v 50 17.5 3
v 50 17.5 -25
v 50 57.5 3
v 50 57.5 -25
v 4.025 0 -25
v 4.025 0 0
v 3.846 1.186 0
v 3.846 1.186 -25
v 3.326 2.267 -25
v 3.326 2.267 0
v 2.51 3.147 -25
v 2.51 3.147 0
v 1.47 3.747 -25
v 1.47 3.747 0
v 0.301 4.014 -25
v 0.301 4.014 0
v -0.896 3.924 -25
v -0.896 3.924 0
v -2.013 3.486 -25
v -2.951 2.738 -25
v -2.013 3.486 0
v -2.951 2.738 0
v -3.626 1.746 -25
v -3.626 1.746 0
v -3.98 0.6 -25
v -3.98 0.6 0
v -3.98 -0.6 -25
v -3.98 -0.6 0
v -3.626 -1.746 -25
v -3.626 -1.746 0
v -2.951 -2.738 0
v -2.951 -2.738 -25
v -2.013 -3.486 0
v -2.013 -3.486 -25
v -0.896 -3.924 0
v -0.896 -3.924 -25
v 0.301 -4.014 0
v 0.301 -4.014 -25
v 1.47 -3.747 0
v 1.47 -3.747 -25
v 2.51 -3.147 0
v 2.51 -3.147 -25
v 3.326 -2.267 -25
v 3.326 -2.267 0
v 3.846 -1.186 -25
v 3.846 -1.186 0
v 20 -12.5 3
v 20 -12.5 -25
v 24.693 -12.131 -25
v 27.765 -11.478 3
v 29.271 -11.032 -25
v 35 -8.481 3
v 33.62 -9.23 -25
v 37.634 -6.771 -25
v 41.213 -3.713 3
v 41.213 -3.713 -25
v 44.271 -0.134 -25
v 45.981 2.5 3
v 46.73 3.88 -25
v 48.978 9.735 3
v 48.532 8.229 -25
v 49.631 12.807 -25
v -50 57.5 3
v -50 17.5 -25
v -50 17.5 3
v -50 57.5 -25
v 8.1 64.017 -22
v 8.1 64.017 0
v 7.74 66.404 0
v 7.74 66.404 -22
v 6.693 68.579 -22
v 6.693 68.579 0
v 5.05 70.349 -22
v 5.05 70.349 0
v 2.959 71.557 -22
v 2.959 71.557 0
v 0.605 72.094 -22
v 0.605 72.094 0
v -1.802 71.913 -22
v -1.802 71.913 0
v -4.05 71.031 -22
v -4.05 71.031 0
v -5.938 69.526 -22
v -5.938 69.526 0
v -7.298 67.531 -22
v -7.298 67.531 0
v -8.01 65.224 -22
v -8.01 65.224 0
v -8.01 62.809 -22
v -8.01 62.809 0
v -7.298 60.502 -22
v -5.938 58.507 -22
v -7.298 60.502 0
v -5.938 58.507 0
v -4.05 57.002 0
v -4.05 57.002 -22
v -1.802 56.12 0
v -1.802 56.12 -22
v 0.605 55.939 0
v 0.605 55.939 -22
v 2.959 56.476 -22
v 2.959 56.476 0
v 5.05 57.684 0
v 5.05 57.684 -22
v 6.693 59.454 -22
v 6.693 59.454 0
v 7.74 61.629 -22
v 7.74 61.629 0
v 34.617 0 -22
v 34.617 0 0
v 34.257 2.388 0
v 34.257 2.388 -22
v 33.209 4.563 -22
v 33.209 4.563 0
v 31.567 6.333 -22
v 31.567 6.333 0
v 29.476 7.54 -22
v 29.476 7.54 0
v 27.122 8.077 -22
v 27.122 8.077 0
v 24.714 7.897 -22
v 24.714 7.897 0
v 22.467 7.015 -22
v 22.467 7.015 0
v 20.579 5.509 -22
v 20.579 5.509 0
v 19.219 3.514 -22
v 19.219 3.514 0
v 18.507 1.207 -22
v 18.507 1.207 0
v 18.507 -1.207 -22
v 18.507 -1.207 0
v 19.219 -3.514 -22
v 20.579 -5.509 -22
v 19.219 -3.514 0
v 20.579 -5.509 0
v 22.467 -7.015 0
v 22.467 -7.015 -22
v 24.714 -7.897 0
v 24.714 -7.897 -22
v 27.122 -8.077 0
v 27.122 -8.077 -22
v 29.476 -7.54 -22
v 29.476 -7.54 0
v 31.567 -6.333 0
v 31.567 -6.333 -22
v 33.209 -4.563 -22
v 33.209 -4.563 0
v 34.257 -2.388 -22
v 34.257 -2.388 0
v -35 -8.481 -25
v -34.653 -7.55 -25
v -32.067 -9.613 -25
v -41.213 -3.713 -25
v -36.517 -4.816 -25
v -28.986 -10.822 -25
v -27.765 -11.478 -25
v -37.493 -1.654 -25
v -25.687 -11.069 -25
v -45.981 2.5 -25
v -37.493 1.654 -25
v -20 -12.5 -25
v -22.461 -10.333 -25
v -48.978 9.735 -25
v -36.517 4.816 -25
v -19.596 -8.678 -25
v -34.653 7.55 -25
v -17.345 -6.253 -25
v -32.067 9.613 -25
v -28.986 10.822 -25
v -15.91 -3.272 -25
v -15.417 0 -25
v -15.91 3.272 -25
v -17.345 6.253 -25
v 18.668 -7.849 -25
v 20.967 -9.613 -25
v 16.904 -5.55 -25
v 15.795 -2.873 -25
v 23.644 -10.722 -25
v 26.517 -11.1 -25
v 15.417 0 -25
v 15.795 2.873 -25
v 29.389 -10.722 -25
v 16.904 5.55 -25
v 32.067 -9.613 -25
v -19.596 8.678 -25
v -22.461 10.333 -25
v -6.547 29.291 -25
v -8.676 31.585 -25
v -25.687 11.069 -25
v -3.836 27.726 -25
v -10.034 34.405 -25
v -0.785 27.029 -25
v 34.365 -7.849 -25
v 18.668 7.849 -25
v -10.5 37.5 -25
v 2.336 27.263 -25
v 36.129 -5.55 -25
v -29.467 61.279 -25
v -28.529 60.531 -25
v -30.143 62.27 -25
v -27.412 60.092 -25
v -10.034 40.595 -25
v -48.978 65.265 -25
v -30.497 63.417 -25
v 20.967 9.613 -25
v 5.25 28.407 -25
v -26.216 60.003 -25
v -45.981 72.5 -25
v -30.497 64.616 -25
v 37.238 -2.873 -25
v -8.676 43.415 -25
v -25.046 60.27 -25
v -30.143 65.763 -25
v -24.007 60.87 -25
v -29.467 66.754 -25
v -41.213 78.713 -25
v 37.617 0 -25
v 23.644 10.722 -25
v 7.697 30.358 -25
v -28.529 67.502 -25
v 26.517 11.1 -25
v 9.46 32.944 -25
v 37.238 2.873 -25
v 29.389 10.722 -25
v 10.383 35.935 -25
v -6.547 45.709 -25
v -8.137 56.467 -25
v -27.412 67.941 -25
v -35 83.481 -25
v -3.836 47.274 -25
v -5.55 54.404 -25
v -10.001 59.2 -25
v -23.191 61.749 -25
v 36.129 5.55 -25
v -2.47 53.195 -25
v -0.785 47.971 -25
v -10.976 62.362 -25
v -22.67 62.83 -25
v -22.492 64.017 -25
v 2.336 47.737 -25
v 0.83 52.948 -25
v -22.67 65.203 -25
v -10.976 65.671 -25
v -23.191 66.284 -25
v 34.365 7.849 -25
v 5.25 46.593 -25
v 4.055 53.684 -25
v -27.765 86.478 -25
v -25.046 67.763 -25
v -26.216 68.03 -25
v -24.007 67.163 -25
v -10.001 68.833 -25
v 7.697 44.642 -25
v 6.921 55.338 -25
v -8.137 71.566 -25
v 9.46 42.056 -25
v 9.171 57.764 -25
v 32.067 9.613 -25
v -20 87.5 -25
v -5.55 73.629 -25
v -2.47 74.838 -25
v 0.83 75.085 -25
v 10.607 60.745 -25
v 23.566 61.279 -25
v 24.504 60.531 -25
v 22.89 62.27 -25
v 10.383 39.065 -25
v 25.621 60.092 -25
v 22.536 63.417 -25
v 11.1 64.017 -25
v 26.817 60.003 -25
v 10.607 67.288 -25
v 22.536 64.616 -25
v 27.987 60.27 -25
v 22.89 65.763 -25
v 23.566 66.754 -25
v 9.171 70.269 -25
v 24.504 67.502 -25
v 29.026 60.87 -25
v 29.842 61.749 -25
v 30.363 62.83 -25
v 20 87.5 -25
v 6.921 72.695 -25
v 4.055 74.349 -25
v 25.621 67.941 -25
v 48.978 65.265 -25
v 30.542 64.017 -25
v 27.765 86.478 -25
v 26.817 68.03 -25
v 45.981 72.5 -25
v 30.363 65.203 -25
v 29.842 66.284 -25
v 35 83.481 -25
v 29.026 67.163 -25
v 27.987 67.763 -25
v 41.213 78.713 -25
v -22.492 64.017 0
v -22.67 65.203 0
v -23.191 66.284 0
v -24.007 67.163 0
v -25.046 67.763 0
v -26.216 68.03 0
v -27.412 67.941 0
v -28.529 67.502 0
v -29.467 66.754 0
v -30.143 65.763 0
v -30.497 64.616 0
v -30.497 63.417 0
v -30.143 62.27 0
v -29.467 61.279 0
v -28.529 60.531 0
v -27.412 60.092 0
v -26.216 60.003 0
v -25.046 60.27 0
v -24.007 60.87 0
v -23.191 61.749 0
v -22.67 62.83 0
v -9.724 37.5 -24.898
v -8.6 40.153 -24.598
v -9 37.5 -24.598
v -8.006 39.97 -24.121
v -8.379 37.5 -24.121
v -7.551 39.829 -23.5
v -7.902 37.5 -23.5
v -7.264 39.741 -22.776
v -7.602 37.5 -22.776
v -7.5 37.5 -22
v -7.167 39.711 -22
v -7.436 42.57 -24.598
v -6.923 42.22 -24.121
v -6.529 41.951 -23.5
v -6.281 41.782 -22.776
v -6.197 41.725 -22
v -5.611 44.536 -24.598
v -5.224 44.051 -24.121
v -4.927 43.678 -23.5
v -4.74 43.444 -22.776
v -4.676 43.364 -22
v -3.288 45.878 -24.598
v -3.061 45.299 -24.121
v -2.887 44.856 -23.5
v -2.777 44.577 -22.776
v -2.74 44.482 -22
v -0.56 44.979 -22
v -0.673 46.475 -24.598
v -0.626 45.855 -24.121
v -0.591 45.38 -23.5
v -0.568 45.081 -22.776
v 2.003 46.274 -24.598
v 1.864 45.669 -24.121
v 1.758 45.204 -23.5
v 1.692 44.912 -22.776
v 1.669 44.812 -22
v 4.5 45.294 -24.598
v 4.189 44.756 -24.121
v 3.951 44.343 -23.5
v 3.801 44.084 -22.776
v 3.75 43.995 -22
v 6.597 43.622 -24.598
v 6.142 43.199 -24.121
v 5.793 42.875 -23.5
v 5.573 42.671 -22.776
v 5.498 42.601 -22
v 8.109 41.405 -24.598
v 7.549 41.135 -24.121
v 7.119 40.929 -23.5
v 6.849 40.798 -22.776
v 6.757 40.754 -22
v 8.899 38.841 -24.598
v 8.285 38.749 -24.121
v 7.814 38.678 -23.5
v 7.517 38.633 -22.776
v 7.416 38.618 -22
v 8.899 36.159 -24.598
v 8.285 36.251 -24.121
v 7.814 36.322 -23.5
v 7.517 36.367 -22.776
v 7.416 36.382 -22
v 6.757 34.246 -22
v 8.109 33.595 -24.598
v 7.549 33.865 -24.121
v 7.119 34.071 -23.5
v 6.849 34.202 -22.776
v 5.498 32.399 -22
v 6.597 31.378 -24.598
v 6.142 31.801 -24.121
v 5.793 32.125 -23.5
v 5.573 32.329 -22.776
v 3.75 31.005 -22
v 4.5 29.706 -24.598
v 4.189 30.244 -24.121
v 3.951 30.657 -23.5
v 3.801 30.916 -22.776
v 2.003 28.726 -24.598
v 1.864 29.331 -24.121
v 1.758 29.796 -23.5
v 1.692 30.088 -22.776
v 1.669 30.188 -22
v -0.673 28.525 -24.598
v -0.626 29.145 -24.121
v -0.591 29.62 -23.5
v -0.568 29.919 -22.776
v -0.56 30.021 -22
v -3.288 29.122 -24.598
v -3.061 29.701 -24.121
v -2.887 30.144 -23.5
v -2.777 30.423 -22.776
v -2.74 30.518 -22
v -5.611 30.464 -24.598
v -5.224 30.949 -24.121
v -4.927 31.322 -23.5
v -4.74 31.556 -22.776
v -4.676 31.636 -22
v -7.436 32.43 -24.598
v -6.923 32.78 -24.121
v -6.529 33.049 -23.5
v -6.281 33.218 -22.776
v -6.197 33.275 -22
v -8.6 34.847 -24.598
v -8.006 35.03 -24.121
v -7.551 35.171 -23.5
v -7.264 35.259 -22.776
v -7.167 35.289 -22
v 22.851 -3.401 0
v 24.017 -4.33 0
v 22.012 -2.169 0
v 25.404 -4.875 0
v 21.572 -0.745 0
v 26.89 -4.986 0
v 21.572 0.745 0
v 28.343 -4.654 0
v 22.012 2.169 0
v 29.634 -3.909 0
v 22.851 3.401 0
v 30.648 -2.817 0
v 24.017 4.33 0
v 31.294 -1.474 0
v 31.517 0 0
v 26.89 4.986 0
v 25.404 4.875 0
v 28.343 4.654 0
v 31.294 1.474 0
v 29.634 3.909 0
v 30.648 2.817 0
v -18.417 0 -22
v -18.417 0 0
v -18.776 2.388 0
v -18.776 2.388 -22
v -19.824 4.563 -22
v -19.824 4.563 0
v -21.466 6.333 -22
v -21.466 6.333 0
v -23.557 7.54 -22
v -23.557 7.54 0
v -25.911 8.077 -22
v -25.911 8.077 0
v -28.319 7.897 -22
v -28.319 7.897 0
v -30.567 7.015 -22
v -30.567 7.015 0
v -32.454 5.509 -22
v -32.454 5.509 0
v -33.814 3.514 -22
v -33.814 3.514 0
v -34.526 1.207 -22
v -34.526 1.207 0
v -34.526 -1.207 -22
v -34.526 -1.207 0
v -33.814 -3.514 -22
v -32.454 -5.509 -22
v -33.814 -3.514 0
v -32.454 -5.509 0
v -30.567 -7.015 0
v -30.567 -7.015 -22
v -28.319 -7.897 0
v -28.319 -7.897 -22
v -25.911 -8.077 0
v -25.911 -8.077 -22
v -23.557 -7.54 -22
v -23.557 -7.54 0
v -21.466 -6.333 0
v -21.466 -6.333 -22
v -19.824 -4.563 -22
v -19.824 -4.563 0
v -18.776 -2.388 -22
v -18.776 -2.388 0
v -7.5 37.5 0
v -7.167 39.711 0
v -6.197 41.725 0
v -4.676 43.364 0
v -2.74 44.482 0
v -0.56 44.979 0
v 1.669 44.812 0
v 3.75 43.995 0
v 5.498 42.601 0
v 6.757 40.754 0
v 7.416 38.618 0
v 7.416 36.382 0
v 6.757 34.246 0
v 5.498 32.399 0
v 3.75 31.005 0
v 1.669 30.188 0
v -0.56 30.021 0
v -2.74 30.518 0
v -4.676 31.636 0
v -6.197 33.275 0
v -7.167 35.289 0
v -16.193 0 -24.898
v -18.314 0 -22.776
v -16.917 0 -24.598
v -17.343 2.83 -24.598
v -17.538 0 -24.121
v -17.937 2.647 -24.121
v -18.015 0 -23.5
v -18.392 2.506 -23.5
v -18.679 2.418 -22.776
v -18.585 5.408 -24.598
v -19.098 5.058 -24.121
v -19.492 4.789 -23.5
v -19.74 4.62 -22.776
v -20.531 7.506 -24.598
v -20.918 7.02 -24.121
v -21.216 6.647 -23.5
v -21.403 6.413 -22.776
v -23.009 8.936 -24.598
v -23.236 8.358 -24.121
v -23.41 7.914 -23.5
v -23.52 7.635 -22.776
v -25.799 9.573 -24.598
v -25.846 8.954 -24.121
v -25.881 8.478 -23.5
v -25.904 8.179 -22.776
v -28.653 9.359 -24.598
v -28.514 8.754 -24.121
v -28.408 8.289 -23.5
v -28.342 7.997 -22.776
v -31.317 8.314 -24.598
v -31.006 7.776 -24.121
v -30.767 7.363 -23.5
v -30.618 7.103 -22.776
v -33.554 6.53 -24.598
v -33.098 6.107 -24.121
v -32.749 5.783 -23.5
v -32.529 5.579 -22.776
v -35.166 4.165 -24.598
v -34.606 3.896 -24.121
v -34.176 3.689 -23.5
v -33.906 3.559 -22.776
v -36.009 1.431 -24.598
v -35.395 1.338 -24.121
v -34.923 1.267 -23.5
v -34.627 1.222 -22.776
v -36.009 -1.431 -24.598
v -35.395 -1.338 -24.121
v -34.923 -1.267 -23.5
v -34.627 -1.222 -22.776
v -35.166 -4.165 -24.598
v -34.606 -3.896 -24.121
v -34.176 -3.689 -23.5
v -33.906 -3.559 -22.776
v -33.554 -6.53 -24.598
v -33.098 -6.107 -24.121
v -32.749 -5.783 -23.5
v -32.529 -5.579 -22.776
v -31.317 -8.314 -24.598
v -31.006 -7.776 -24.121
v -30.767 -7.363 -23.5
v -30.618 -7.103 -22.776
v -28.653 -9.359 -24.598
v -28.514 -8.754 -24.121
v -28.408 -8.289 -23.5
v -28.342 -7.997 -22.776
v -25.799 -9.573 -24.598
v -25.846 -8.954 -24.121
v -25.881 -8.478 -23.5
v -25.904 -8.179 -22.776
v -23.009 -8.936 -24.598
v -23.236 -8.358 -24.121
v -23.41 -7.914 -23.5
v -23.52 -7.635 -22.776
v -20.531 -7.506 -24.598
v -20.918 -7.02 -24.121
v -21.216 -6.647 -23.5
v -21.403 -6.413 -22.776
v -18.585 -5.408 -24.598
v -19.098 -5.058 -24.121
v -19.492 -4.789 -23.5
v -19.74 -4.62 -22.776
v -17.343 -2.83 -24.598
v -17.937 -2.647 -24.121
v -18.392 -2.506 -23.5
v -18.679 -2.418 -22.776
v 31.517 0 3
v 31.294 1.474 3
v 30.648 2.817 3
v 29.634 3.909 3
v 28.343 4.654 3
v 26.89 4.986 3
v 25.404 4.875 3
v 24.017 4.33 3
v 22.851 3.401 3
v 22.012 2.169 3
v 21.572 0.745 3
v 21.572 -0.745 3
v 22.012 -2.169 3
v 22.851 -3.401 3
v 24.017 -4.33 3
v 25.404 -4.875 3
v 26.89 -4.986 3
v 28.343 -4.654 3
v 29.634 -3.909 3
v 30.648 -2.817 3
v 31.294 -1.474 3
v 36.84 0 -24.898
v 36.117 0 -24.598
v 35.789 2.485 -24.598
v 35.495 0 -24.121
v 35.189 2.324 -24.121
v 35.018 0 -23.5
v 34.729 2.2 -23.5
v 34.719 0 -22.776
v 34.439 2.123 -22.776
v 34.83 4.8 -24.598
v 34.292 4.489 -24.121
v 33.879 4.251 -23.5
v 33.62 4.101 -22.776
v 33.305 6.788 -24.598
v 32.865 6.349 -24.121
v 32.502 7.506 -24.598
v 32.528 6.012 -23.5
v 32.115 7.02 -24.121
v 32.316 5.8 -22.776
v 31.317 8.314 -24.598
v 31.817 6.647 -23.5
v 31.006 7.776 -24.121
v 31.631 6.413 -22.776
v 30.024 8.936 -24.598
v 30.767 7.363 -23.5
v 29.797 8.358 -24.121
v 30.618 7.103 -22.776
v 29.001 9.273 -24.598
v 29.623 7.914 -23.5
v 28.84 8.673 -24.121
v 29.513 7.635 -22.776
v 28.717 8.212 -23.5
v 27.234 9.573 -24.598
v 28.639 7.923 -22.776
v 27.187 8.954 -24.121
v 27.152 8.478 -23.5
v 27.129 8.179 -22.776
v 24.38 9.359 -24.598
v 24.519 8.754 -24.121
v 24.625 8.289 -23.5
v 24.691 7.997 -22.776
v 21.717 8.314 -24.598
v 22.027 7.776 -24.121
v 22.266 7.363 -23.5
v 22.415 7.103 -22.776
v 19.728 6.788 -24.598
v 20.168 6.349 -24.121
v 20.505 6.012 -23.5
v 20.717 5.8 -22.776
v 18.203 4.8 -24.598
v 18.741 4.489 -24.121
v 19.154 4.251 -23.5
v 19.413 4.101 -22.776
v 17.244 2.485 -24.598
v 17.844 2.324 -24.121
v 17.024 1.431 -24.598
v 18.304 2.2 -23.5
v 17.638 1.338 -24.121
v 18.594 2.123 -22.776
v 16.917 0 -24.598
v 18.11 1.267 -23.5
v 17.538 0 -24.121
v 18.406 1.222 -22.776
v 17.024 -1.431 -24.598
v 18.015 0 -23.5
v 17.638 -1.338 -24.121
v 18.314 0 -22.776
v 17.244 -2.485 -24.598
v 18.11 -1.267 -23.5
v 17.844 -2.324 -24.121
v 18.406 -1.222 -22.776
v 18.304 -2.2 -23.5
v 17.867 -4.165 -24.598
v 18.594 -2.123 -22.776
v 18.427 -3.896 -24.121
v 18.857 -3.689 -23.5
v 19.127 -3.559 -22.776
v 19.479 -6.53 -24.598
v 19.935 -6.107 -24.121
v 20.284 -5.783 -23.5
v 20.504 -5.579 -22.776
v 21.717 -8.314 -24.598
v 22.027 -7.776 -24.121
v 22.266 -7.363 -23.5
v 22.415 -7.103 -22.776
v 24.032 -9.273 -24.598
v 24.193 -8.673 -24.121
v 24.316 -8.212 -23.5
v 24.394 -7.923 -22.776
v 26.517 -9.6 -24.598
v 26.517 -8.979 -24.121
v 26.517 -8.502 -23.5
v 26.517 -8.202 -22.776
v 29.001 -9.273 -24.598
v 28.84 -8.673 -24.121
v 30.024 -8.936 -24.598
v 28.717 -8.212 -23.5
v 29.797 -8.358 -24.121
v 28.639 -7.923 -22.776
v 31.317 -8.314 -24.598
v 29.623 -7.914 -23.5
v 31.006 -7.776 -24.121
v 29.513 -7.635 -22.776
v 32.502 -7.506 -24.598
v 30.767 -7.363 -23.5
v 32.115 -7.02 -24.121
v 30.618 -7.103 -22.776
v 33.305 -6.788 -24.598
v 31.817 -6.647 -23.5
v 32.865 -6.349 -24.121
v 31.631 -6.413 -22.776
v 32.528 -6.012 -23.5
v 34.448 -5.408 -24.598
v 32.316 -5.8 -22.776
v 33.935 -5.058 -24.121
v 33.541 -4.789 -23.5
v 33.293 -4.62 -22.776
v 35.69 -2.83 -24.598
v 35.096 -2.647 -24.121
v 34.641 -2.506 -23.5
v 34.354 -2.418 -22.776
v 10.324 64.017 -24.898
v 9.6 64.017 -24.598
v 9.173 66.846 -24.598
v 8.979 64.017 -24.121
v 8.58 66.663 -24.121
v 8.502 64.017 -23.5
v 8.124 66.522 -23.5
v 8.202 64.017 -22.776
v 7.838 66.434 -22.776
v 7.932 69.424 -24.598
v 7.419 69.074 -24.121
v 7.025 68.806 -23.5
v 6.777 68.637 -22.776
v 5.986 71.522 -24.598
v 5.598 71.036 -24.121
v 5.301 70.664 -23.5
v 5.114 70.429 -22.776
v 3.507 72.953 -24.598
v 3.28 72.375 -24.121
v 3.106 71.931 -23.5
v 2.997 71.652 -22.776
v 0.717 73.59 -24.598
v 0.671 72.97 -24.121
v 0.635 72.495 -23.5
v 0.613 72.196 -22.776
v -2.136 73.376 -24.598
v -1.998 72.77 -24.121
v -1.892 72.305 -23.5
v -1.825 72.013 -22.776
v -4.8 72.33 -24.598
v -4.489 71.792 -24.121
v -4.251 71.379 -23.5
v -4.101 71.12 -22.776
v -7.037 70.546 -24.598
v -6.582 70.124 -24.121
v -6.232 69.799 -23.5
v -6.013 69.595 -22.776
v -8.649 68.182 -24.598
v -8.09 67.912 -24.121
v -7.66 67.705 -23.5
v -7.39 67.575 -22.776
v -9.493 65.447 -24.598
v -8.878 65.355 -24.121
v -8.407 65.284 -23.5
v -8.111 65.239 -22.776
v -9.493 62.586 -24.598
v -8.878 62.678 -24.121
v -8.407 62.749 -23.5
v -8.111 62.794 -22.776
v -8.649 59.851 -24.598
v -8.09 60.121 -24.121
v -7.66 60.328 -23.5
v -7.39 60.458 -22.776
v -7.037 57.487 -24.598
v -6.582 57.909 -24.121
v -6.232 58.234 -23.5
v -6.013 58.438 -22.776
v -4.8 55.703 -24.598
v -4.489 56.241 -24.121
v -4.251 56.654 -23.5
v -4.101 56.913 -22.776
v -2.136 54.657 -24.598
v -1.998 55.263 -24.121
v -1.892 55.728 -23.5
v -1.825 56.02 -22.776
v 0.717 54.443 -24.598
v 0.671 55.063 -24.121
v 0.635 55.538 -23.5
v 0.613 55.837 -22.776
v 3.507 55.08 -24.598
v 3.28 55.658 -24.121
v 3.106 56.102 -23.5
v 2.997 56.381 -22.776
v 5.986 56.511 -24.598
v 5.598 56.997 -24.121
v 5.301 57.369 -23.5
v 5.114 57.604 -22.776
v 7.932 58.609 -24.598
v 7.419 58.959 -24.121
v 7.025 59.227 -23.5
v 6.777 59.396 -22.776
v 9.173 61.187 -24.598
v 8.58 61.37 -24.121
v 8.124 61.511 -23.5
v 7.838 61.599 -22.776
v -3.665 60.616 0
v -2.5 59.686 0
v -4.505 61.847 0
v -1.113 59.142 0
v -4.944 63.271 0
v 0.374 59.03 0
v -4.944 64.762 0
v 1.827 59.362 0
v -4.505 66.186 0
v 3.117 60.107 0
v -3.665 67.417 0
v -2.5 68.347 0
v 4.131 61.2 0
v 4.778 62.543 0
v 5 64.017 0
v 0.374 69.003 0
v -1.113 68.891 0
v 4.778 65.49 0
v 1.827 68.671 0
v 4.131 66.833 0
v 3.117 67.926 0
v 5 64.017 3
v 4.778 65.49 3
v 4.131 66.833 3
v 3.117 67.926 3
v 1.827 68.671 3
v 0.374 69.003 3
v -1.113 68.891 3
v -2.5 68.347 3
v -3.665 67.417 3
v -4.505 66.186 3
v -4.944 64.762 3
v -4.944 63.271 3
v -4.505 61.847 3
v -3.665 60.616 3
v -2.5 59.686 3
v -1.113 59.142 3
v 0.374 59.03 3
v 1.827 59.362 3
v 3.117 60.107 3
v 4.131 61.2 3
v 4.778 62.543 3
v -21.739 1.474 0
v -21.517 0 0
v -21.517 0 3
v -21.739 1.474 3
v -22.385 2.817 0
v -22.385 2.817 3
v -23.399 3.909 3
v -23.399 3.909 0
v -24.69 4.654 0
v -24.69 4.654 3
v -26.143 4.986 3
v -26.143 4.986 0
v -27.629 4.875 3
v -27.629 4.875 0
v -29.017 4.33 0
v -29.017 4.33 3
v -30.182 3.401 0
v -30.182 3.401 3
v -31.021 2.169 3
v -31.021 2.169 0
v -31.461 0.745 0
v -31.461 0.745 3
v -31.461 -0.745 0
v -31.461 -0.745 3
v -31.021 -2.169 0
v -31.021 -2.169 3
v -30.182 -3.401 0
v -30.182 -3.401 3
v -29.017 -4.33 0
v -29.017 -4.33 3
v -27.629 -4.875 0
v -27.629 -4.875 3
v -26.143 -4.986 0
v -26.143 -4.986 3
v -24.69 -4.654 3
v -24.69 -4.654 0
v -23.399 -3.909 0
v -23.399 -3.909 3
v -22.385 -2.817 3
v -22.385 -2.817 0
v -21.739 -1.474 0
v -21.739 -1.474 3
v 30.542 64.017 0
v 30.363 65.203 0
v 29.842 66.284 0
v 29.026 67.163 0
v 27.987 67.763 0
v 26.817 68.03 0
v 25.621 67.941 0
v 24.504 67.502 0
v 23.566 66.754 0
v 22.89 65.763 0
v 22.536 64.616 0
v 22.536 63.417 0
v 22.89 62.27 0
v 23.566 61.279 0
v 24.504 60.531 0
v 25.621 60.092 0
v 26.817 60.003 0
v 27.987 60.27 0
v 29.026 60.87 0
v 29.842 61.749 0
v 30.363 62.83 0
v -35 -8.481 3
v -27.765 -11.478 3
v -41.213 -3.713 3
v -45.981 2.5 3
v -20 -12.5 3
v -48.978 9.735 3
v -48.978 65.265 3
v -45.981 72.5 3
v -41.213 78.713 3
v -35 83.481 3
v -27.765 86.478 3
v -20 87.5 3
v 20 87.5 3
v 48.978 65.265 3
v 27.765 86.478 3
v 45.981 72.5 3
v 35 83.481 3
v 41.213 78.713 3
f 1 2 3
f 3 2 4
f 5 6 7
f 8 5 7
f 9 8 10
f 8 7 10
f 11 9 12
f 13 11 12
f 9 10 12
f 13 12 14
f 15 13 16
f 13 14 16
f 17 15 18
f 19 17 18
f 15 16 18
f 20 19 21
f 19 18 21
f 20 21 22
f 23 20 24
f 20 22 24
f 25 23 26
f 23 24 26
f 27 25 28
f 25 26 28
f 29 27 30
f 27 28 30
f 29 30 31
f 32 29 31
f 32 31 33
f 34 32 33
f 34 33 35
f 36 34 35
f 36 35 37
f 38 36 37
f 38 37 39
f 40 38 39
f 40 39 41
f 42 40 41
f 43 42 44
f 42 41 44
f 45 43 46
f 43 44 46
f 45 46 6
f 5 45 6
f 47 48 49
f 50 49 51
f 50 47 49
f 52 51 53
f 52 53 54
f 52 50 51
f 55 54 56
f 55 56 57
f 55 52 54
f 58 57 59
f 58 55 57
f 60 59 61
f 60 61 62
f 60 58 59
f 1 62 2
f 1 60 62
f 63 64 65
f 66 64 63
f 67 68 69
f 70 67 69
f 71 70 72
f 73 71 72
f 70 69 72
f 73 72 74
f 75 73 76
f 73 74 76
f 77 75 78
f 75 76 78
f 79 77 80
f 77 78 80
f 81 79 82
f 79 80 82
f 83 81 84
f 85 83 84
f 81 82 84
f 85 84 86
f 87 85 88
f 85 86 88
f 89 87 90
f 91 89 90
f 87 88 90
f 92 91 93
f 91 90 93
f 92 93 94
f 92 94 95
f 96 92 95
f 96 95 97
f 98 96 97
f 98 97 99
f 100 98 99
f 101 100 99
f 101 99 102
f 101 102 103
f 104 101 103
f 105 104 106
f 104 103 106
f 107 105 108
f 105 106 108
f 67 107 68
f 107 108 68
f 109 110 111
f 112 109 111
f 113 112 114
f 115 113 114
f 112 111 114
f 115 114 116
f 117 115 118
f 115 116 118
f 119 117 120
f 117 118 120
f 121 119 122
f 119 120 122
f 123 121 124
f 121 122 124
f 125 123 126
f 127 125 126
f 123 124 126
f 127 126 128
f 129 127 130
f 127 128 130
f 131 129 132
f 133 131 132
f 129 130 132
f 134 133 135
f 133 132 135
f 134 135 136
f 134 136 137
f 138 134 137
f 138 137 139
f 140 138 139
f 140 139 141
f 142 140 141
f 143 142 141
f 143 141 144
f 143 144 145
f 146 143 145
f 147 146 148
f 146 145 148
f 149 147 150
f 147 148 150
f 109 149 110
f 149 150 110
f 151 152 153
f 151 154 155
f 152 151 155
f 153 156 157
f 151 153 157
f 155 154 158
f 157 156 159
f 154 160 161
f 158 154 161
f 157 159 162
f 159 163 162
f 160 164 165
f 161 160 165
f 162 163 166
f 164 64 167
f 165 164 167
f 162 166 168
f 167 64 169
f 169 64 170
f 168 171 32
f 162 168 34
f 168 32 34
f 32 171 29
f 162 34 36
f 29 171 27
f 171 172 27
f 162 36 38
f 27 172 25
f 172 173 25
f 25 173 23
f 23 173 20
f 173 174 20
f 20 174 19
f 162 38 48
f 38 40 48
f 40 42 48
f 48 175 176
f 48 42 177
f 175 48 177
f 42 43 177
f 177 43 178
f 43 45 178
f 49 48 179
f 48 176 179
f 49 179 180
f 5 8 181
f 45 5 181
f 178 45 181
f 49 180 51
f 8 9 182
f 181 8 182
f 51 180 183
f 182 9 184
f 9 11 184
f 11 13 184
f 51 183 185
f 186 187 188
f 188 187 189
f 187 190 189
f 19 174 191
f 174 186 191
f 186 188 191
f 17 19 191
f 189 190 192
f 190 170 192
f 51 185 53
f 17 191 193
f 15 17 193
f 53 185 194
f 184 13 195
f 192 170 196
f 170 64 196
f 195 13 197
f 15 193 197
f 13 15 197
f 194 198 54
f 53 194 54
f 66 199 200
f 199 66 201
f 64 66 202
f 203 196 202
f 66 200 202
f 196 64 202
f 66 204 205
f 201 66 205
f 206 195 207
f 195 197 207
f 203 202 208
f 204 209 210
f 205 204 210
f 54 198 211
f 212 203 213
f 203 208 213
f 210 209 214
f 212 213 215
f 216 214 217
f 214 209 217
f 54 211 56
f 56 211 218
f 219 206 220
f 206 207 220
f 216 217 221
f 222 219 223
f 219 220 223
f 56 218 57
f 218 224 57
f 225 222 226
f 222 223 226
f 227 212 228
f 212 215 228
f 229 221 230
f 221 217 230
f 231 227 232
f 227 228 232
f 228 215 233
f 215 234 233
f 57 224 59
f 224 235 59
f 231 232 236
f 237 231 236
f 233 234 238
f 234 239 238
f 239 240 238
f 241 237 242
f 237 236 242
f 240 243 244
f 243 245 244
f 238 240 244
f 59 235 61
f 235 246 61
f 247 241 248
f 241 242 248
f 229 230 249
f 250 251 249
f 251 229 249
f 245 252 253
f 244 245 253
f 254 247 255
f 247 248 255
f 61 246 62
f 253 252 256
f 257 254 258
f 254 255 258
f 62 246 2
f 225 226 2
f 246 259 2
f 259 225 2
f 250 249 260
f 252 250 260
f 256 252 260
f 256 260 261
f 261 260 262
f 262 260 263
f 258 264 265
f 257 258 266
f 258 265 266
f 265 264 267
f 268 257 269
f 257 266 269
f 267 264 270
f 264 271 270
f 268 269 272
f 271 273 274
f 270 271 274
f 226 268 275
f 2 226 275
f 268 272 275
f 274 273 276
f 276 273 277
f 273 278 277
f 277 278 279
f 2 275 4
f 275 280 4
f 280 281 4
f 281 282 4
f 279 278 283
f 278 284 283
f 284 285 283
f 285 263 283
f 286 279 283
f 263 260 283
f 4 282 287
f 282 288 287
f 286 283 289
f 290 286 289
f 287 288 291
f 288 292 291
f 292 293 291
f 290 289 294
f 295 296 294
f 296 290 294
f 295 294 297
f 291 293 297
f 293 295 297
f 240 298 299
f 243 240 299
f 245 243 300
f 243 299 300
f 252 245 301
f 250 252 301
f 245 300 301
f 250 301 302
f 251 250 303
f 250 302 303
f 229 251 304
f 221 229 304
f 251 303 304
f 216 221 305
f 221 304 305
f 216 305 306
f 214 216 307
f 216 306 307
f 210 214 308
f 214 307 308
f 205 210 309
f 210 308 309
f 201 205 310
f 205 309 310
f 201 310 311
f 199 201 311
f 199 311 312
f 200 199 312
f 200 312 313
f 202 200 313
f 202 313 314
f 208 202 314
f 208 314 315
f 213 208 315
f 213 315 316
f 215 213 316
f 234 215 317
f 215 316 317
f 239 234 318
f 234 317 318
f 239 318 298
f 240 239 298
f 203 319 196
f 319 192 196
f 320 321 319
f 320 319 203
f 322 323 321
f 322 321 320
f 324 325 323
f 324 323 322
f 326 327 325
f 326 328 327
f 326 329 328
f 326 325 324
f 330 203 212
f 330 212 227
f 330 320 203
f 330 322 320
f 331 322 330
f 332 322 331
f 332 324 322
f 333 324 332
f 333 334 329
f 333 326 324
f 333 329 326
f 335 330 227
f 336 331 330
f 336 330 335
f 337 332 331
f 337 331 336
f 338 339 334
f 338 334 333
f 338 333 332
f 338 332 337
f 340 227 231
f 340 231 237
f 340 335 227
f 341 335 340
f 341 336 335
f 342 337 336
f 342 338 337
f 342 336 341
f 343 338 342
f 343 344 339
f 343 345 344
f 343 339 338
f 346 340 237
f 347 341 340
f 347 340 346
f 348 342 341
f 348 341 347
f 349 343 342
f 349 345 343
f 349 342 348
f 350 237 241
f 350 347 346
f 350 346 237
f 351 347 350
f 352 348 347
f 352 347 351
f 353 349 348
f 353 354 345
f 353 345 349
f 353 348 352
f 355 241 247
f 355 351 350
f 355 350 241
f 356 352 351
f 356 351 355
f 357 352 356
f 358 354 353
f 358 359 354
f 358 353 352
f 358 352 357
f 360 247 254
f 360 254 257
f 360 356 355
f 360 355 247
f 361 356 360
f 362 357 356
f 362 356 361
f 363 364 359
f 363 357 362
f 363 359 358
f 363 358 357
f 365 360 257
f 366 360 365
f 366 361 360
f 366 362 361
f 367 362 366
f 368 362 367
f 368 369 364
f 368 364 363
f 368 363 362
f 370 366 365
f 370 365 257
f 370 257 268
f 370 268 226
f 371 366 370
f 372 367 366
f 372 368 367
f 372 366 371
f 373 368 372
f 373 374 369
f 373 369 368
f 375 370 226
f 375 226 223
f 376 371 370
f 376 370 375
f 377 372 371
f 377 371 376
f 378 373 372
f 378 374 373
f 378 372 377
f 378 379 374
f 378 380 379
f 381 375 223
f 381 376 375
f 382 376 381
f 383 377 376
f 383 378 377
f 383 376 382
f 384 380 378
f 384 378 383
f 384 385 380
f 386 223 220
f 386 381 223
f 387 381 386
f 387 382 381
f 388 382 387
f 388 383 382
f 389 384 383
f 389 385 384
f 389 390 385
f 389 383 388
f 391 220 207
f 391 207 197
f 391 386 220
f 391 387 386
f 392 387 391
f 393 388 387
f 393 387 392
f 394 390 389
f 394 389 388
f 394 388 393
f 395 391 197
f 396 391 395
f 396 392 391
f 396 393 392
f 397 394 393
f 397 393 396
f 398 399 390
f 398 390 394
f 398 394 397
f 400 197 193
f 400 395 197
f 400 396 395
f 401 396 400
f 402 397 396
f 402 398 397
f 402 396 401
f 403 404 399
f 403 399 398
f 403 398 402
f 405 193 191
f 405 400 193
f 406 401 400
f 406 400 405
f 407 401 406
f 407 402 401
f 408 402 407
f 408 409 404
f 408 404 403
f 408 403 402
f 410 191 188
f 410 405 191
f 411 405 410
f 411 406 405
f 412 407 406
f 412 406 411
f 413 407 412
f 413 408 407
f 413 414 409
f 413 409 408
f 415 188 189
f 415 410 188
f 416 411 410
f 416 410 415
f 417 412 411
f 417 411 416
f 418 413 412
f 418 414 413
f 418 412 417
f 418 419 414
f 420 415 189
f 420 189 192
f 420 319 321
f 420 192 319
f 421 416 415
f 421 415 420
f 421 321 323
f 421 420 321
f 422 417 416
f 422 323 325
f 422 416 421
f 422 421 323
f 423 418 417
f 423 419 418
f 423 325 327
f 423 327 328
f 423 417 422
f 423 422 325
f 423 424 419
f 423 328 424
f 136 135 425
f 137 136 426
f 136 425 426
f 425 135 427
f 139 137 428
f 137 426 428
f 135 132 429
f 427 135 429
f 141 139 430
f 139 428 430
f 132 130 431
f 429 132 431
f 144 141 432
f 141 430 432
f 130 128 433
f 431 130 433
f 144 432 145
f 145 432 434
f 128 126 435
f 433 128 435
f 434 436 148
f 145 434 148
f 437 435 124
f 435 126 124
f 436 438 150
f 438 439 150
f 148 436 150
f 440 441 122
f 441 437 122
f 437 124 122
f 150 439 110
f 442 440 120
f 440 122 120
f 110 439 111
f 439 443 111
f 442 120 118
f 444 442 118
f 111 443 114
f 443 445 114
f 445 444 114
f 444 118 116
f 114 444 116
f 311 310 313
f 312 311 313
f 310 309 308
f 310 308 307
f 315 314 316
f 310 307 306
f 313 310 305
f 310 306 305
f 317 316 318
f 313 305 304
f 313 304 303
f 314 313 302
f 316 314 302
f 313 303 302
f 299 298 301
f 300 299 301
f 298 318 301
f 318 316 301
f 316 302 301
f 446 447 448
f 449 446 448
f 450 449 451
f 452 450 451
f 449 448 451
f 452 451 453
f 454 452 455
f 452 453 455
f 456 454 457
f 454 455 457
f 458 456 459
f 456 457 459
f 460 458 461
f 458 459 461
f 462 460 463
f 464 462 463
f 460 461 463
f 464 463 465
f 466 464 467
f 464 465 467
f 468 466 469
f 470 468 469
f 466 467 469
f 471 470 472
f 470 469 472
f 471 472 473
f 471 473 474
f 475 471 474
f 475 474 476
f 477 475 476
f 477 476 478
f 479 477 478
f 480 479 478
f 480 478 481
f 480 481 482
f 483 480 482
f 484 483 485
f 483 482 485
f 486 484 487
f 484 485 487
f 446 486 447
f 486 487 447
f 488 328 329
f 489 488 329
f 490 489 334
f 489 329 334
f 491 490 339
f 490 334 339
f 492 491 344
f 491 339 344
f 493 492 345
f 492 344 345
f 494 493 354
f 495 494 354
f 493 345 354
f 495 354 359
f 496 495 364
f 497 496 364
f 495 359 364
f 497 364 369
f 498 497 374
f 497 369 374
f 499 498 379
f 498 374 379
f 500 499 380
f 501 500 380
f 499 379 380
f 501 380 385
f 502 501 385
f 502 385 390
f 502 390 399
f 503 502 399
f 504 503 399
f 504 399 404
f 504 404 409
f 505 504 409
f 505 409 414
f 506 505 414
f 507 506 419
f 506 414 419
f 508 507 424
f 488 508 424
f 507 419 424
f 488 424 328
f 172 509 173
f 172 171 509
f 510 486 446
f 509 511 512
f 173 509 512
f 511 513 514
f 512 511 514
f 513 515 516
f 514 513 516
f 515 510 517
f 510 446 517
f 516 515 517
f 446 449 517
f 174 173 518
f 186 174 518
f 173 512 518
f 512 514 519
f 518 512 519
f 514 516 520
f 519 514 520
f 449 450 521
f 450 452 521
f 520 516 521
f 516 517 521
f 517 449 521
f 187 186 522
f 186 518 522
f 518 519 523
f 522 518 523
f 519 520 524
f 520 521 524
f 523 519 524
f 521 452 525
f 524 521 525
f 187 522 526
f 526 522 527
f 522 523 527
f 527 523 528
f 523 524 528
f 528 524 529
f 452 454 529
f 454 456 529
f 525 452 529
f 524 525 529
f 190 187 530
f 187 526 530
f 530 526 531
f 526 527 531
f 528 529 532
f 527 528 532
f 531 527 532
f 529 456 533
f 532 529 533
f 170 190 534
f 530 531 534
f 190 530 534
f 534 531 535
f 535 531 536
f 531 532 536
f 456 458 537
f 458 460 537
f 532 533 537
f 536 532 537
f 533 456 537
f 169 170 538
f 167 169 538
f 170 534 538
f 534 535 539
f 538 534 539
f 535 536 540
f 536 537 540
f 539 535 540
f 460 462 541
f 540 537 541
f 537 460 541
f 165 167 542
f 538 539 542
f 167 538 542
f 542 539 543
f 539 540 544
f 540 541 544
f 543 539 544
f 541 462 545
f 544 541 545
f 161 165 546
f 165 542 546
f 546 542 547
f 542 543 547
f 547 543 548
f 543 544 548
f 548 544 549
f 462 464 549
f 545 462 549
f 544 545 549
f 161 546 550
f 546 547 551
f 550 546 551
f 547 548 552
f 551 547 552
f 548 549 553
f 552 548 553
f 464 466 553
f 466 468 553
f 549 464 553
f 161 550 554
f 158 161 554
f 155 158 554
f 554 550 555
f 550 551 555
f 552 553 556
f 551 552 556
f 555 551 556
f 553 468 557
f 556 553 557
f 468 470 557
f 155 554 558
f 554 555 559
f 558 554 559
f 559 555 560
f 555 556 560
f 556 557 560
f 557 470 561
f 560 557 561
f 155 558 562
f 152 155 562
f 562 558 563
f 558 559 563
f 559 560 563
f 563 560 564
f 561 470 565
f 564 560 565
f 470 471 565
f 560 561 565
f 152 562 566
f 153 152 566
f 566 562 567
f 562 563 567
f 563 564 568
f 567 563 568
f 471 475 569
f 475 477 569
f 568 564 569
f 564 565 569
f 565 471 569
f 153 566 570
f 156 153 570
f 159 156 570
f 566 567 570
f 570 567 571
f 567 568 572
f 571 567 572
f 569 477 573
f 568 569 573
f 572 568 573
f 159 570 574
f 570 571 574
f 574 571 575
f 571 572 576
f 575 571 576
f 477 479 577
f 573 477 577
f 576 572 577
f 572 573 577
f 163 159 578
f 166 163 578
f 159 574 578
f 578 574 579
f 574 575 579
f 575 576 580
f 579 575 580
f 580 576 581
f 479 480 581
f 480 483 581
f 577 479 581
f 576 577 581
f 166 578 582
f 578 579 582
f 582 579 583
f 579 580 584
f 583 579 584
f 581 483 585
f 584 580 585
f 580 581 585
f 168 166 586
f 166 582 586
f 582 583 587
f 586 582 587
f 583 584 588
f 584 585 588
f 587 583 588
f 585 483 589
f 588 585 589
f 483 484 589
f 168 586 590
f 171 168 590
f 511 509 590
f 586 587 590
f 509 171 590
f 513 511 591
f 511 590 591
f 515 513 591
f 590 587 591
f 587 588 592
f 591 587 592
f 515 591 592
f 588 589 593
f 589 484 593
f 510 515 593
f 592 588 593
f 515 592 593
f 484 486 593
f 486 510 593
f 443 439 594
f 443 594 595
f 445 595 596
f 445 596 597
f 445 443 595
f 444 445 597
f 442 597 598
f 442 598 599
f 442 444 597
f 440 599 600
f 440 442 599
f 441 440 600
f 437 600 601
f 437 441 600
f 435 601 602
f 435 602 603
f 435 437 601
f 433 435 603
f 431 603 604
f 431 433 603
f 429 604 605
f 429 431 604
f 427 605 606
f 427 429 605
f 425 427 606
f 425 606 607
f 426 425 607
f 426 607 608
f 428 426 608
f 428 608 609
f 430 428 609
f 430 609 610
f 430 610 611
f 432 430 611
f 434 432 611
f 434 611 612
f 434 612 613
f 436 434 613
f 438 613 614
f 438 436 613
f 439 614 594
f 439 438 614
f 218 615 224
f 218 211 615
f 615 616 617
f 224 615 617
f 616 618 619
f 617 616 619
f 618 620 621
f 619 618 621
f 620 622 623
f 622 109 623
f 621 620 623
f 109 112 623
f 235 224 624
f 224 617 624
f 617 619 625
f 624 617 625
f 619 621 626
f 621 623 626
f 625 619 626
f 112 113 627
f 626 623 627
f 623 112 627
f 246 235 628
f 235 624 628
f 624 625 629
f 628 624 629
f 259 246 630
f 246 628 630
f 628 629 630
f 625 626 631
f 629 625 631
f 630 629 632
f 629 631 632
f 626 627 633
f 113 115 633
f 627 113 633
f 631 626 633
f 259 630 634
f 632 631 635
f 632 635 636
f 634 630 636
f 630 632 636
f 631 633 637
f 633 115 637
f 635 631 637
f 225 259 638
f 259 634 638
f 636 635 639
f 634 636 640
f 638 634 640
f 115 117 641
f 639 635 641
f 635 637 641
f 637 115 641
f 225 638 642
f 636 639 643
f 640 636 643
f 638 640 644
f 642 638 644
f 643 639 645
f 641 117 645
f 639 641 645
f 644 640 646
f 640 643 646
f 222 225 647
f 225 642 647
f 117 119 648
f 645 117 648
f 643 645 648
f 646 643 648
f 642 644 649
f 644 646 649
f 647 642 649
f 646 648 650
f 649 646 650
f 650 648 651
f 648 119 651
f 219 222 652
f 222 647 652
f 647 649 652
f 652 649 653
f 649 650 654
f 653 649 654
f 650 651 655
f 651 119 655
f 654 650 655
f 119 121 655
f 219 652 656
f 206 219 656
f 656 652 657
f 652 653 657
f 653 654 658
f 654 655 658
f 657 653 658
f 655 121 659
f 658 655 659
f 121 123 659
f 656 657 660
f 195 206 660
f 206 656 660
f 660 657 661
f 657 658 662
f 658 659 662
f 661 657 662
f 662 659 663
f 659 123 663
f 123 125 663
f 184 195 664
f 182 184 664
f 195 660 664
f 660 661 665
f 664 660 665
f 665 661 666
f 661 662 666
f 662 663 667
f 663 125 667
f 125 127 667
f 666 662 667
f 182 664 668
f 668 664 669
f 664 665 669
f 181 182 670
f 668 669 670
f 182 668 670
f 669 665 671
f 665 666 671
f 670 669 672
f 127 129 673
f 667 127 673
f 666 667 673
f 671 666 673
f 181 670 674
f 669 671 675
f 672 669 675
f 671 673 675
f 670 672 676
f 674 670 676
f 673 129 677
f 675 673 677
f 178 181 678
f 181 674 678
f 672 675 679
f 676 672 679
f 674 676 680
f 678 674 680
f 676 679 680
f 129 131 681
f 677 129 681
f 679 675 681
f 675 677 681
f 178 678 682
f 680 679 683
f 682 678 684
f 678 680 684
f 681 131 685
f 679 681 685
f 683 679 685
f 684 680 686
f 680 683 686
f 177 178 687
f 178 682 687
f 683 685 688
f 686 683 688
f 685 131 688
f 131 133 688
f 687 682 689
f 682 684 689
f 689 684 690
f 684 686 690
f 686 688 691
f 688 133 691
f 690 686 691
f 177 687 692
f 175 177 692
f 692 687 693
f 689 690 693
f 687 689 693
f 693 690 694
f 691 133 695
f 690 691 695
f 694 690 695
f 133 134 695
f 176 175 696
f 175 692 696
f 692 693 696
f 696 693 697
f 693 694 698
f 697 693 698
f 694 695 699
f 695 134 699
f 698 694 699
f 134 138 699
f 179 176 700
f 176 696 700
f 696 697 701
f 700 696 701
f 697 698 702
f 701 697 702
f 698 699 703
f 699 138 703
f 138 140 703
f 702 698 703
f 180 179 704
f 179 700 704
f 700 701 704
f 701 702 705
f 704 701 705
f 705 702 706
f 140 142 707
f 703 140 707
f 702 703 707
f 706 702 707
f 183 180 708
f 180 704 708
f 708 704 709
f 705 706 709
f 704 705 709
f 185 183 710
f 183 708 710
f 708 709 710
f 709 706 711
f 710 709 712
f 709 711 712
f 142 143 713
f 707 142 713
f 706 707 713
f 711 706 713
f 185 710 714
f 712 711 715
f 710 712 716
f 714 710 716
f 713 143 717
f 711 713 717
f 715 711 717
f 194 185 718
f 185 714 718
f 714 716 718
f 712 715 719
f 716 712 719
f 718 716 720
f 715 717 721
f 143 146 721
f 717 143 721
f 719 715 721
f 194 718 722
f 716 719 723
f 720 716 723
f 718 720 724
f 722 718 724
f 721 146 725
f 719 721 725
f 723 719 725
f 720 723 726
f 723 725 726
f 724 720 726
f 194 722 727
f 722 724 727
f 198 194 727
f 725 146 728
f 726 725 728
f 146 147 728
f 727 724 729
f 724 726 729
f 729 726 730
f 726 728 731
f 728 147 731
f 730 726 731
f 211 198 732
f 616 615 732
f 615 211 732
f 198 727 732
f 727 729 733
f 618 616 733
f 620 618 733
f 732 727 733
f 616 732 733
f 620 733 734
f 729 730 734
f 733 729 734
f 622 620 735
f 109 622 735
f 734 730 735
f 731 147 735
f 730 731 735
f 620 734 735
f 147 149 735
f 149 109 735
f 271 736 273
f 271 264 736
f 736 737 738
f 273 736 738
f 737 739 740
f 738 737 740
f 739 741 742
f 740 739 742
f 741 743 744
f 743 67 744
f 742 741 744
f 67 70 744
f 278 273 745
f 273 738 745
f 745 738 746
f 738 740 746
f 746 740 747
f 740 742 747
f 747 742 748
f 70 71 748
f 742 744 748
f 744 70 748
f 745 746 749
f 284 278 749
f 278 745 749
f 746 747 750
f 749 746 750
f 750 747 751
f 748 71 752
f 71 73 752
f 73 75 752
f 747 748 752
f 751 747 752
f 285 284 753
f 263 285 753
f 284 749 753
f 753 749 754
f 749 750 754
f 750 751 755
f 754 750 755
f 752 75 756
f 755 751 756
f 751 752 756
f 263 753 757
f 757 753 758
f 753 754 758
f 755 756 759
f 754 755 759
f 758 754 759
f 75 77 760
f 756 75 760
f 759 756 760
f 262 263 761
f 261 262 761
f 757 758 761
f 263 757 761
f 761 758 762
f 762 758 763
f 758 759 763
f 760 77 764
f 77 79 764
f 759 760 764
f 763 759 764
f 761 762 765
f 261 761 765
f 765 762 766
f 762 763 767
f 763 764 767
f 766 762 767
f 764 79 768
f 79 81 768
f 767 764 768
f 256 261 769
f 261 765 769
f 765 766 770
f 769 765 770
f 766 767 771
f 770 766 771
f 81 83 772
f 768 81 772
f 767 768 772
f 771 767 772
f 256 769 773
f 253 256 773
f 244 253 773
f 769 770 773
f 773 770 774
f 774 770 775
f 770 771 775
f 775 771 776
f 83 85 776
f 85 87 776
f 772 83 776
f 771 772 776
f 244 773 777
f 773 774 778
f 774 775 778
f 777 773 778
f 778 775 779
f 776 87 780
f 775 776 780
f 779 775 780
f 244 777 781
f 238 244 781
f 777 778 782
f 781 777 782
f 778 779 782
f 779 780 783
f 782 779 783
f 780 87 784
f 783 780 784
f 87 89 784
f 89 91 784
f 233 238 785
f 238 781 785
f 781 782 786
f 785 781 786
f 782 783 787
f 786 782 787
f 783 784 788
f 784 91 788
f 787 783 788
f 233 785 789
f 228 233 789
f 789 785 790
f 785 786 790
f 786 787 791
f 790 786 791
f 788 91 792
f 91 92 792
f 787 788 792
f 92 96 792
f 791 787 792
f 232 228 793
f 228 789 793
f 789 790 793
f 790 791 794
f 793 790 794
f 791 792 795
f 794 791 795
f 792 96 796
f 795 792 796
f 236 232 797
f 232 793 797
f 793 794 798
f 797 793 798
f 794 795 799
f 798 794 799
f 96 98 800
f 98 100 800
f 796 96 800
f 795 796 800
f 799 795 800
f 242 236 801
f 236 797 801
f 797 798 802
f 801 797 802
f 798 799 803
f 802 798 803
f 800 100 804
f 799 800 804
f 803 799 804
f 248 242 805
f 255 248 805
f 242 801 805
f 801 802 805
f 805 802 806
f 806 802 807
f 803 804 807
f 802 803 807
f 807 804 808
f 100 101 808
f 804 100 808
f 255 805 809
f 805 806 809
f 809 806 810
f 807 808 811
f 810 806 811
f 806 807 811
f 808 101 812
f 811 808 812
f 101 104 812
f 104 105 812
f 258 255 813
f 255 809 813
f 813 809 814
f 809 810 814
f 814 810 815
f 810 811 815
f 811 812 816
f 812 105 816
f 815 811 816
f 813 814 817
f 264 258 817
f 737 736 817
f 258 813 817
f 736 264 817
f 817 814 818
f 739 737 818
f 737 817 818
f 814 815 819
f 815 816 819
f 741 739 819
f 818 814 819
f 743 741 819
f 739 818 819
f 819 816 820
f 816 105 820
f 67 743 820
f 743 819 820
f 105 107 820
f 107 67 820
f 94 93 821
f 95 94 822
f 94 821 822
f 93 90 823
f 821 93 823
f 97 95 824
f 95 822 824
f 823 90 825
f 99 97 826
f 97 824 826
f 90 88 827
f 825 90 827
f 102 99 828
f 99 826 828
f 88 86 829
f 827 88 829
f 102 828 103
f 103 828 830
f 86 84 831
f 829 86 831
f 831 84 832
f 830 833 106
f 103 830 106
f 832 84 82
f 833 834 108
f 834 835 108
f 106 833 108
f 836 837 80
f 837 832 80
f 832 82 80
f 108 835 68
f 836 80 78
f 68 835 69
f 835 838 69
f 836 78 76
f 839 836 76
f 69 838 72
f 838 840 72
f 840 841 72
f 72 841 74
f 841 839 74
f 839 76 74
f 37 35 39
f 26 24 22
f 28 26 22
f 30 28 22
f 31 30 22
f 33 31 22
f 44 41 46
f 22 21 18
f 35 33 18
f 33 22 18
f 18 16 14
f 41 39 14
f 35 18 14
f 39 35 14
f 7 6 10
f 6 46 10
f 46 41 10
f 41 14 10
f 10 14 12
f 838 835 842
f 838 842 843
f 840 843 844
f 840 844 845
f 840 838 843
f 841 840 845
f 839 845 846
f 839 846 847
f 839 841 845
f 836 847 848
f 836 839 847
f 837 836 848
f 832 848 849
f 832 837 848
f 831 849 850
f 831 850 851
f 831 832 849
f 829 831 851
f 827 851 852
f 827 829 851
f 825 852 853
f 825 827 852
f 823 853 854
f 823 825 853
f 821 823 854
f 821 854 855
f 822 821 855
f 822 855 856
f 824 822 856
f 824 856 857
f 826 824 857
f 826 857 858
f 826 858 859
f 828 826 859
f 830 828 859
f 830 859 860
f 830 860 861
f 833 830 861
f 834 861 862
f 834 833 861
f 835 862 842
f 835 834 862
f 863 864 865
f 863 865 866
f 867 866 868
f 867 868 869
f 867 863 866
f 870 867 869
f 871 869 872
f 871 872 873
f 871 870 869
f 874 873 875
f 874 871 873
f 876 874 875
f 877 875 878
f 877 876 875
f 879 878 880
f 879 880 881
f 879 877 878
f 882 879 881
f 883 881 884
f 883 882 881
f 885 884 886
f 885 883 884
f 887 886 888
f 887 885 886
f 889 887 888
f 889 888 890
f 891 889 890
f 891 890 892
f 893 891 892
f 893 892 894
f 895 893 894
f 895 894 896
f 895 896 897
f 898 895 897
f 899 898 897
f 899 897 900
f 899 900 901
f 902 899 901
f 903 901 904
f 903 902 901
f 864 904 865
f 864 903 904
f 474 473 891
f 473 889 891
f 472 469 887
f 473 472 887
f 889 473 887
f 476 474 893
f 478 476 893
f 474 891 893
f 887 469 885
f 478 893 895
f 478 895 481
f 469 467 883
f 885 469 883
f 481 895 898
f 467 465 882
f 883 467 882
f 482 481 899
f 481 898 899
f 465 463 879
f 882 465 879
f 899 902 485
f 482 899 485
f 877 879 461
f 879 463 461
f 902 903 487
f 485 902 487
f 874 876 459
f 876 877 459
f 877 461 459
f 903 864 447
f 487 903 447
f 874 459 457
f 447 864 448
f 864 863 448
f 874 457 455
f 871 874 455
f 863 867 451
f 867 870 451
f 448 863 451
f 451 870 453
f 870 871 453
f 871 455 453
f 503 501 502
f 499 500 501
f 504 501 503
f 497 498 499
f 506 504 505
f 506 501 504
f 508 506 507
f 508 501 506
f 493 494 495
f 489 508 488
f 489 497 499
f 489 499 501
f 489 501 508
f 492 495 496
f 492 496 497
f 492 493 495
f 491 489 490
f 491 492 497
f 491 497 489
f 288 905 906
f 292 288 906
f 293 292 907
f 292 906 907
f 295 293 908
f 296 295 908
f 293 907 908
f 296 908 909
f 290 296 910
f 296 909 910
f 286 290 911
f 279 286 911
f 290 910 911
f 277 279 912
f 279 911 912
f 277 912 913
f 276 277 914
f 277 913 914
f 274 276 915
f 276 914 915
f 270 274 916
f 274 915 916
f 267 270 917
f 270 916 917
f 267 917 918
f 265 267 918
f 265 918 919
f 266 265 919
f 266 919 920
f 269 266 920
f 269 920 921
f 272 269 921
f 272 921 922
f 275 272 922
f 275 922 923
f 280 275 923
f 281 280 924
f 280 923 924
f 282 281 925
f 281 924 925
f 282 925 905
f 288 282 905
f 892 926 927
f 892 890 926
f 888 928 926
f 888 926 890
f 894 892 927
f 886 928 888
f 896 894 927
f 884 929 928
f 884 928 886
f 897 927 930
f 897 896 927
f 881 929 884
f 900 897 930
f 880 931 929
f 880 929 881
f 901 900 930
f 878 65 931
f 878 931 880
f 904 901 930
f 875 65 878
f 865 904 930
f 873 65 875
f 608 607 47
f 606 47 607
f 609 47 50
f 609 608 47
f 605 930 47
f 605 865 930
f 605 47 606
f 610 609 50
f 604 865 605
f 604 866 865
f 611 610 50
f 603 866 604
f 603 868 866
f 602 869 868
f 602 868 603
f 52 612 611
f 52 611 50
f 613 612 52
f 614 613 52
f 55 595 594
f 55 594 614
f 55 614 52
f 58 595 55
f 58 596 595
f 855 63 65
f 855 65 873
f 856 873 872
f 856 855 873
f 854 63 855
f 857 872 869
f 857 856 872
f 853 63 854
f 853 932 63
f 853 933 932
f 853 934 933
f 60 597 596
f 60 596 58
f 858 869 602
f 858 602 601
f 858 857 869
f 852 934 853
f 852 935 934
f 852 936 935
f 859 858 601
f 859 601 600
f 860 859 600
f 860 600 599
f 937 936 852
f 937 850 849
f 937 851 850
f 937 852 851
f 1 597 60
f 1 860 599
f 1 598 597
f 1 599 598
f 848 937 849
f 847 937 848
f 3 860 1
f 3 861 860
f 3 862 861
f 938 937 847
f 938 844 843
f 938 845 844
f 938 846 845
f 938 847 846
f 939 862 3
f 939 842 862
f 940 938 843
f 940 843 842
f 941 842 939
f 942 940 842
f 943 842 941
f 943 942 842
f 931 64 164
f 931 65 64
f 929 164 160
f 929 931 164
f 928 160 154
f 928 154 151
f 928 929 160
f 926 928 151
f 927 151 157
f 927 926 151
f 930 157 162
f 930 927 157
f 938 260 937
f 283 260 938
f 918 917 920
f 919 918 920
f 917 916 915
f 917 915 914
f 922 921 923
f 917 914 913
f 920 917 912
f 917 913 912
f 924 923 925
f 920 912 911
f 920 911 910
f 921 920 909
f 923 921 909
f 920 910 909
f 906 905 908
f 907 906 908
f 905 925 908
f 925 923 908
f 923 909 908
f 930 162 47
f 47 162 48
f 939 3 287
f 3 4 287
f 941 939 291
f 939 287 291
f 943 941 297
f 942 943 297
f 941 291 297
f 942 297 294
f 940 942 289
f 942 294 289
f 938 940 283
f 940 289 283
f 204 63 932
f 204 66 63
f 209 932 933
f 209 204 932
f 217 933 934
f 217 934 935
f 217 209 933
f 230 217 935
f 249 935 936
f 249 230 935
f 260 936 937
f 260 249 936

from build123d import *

# Parameters (mm, degrees)
SKETCH1_W           = 100
SKETCH1_H           = 100
SKETCH1_R           = 4.025
SKETCH1_R_2         = 8.1
BOSS_EXTRUDE1_DEPTH = 25
SKETCH2_W           = 100
SKETCH2_H           = 100
SKETCH2_R           = 5
BOSS_EXTRUDE2_DEPTH = 3
FILLET1_R           = 30
FILLET2_R           = 3
SKETCH3_R           = 7.5
CUT_EXTRUDE1_DEPTH  = 25
FILLET3_R           = 3


with BuildPart() as part:
    # Sketch1 → Boss-Extrude1 (new body)
    with BuildSketch(Plane.XY):
        with Locations((0, 37.5)):
            Rectangle(SKETCH1_W, SKETCH1_H)
        Circle(SKETCH1_R, mode=Mode.SUBTRACT)
        with Locations((26.516504294, 64.016504294)):
            Circle(SKETCH1_R, mode=Mode.SUBTRACT)
        with Locations((-26.516504294, 64.016504294)):
            Circle(SKETCH1_R, mode=Mode.SUBTRACT)
        with Locations((0, 64.016504294)):
            Circle(SKETCH1_R_2, mode=Mode.SUBTRACT)
        with Locations((-26.516504294, 0)):
            Circle(SKETCH1_R_2, mode=Mode.SUBTRACT)
        with Locations((26.516504294, 0)):
            Circle(SKETCH1_R_2, mode=Mode.SUBTRACT)
    extrude(amount=-BOSS_EXTRUDE1_DEPTH)

    # Sketch2 → Boss-Extrude2 (add)
    with BuildSketch(Plane.XY):
        with Locations((0, 37.5)):
            Rectangle(SKETCH2_W, SKETCH2_H)
        with Locations((0, 64.016504294)):
            Circle(SKETCH2_R, mode=Mode.SUBTRACT)
        with Locations((26.516504294, 0)):
            Circle(SKETCH2_R, mode=Mode.SUBTRACT)
        with Locations((-26.516504294, 0)):
            Circle(SKETCH2_R, mode=Mode.SUBTRACT)
    extrude(amount=BOSS_EXTRUDE2_DEPTH)

    # Fillet1
    fillet1_edges = [part.edges().sort_by_distance(p)[0] for p in [
        (-50, 87.5, -11),
        (50, 87.5, -11),
        (50, -12.5, -11),
        (-50, -12.5, -11),
    ]]
    fillet(fillet1_edges, radius=FILLET1_R)

    # Fillet2
    fillet2_edges = [part.edges().sort_by_distance(p)[0] for p in [
        (-8.1, 64.016504294, -25),
        (-34.616504294, 0, -25),
        (18.416504295, 0, -25),
    ]]
    fillet(fillet2_edges, radius=FILLET2_R)

    # Sketch3 → Cut-Extrude1 (cut)
    with BuildSketch(Plane(origin=(0, 0, -25), x_dir=(-1, 0, 0), z_dir=(0, 0, -1))):
        with Locations((0, 37.5)):
            Circle(SKETCH3_R)
    extrude(amount=-CUT_EXTRUDE1_DEPTH, mode=Mode.SUBTRACT)

    # Fillet3
    fillet3_edges = [part.edges().sort_by_distance(p)[0] for p in [
        (7.5, 37.5, -25),
    ]]
    fillet(fillet3_edges, radius=FILLET3_R)


solid = part.part
